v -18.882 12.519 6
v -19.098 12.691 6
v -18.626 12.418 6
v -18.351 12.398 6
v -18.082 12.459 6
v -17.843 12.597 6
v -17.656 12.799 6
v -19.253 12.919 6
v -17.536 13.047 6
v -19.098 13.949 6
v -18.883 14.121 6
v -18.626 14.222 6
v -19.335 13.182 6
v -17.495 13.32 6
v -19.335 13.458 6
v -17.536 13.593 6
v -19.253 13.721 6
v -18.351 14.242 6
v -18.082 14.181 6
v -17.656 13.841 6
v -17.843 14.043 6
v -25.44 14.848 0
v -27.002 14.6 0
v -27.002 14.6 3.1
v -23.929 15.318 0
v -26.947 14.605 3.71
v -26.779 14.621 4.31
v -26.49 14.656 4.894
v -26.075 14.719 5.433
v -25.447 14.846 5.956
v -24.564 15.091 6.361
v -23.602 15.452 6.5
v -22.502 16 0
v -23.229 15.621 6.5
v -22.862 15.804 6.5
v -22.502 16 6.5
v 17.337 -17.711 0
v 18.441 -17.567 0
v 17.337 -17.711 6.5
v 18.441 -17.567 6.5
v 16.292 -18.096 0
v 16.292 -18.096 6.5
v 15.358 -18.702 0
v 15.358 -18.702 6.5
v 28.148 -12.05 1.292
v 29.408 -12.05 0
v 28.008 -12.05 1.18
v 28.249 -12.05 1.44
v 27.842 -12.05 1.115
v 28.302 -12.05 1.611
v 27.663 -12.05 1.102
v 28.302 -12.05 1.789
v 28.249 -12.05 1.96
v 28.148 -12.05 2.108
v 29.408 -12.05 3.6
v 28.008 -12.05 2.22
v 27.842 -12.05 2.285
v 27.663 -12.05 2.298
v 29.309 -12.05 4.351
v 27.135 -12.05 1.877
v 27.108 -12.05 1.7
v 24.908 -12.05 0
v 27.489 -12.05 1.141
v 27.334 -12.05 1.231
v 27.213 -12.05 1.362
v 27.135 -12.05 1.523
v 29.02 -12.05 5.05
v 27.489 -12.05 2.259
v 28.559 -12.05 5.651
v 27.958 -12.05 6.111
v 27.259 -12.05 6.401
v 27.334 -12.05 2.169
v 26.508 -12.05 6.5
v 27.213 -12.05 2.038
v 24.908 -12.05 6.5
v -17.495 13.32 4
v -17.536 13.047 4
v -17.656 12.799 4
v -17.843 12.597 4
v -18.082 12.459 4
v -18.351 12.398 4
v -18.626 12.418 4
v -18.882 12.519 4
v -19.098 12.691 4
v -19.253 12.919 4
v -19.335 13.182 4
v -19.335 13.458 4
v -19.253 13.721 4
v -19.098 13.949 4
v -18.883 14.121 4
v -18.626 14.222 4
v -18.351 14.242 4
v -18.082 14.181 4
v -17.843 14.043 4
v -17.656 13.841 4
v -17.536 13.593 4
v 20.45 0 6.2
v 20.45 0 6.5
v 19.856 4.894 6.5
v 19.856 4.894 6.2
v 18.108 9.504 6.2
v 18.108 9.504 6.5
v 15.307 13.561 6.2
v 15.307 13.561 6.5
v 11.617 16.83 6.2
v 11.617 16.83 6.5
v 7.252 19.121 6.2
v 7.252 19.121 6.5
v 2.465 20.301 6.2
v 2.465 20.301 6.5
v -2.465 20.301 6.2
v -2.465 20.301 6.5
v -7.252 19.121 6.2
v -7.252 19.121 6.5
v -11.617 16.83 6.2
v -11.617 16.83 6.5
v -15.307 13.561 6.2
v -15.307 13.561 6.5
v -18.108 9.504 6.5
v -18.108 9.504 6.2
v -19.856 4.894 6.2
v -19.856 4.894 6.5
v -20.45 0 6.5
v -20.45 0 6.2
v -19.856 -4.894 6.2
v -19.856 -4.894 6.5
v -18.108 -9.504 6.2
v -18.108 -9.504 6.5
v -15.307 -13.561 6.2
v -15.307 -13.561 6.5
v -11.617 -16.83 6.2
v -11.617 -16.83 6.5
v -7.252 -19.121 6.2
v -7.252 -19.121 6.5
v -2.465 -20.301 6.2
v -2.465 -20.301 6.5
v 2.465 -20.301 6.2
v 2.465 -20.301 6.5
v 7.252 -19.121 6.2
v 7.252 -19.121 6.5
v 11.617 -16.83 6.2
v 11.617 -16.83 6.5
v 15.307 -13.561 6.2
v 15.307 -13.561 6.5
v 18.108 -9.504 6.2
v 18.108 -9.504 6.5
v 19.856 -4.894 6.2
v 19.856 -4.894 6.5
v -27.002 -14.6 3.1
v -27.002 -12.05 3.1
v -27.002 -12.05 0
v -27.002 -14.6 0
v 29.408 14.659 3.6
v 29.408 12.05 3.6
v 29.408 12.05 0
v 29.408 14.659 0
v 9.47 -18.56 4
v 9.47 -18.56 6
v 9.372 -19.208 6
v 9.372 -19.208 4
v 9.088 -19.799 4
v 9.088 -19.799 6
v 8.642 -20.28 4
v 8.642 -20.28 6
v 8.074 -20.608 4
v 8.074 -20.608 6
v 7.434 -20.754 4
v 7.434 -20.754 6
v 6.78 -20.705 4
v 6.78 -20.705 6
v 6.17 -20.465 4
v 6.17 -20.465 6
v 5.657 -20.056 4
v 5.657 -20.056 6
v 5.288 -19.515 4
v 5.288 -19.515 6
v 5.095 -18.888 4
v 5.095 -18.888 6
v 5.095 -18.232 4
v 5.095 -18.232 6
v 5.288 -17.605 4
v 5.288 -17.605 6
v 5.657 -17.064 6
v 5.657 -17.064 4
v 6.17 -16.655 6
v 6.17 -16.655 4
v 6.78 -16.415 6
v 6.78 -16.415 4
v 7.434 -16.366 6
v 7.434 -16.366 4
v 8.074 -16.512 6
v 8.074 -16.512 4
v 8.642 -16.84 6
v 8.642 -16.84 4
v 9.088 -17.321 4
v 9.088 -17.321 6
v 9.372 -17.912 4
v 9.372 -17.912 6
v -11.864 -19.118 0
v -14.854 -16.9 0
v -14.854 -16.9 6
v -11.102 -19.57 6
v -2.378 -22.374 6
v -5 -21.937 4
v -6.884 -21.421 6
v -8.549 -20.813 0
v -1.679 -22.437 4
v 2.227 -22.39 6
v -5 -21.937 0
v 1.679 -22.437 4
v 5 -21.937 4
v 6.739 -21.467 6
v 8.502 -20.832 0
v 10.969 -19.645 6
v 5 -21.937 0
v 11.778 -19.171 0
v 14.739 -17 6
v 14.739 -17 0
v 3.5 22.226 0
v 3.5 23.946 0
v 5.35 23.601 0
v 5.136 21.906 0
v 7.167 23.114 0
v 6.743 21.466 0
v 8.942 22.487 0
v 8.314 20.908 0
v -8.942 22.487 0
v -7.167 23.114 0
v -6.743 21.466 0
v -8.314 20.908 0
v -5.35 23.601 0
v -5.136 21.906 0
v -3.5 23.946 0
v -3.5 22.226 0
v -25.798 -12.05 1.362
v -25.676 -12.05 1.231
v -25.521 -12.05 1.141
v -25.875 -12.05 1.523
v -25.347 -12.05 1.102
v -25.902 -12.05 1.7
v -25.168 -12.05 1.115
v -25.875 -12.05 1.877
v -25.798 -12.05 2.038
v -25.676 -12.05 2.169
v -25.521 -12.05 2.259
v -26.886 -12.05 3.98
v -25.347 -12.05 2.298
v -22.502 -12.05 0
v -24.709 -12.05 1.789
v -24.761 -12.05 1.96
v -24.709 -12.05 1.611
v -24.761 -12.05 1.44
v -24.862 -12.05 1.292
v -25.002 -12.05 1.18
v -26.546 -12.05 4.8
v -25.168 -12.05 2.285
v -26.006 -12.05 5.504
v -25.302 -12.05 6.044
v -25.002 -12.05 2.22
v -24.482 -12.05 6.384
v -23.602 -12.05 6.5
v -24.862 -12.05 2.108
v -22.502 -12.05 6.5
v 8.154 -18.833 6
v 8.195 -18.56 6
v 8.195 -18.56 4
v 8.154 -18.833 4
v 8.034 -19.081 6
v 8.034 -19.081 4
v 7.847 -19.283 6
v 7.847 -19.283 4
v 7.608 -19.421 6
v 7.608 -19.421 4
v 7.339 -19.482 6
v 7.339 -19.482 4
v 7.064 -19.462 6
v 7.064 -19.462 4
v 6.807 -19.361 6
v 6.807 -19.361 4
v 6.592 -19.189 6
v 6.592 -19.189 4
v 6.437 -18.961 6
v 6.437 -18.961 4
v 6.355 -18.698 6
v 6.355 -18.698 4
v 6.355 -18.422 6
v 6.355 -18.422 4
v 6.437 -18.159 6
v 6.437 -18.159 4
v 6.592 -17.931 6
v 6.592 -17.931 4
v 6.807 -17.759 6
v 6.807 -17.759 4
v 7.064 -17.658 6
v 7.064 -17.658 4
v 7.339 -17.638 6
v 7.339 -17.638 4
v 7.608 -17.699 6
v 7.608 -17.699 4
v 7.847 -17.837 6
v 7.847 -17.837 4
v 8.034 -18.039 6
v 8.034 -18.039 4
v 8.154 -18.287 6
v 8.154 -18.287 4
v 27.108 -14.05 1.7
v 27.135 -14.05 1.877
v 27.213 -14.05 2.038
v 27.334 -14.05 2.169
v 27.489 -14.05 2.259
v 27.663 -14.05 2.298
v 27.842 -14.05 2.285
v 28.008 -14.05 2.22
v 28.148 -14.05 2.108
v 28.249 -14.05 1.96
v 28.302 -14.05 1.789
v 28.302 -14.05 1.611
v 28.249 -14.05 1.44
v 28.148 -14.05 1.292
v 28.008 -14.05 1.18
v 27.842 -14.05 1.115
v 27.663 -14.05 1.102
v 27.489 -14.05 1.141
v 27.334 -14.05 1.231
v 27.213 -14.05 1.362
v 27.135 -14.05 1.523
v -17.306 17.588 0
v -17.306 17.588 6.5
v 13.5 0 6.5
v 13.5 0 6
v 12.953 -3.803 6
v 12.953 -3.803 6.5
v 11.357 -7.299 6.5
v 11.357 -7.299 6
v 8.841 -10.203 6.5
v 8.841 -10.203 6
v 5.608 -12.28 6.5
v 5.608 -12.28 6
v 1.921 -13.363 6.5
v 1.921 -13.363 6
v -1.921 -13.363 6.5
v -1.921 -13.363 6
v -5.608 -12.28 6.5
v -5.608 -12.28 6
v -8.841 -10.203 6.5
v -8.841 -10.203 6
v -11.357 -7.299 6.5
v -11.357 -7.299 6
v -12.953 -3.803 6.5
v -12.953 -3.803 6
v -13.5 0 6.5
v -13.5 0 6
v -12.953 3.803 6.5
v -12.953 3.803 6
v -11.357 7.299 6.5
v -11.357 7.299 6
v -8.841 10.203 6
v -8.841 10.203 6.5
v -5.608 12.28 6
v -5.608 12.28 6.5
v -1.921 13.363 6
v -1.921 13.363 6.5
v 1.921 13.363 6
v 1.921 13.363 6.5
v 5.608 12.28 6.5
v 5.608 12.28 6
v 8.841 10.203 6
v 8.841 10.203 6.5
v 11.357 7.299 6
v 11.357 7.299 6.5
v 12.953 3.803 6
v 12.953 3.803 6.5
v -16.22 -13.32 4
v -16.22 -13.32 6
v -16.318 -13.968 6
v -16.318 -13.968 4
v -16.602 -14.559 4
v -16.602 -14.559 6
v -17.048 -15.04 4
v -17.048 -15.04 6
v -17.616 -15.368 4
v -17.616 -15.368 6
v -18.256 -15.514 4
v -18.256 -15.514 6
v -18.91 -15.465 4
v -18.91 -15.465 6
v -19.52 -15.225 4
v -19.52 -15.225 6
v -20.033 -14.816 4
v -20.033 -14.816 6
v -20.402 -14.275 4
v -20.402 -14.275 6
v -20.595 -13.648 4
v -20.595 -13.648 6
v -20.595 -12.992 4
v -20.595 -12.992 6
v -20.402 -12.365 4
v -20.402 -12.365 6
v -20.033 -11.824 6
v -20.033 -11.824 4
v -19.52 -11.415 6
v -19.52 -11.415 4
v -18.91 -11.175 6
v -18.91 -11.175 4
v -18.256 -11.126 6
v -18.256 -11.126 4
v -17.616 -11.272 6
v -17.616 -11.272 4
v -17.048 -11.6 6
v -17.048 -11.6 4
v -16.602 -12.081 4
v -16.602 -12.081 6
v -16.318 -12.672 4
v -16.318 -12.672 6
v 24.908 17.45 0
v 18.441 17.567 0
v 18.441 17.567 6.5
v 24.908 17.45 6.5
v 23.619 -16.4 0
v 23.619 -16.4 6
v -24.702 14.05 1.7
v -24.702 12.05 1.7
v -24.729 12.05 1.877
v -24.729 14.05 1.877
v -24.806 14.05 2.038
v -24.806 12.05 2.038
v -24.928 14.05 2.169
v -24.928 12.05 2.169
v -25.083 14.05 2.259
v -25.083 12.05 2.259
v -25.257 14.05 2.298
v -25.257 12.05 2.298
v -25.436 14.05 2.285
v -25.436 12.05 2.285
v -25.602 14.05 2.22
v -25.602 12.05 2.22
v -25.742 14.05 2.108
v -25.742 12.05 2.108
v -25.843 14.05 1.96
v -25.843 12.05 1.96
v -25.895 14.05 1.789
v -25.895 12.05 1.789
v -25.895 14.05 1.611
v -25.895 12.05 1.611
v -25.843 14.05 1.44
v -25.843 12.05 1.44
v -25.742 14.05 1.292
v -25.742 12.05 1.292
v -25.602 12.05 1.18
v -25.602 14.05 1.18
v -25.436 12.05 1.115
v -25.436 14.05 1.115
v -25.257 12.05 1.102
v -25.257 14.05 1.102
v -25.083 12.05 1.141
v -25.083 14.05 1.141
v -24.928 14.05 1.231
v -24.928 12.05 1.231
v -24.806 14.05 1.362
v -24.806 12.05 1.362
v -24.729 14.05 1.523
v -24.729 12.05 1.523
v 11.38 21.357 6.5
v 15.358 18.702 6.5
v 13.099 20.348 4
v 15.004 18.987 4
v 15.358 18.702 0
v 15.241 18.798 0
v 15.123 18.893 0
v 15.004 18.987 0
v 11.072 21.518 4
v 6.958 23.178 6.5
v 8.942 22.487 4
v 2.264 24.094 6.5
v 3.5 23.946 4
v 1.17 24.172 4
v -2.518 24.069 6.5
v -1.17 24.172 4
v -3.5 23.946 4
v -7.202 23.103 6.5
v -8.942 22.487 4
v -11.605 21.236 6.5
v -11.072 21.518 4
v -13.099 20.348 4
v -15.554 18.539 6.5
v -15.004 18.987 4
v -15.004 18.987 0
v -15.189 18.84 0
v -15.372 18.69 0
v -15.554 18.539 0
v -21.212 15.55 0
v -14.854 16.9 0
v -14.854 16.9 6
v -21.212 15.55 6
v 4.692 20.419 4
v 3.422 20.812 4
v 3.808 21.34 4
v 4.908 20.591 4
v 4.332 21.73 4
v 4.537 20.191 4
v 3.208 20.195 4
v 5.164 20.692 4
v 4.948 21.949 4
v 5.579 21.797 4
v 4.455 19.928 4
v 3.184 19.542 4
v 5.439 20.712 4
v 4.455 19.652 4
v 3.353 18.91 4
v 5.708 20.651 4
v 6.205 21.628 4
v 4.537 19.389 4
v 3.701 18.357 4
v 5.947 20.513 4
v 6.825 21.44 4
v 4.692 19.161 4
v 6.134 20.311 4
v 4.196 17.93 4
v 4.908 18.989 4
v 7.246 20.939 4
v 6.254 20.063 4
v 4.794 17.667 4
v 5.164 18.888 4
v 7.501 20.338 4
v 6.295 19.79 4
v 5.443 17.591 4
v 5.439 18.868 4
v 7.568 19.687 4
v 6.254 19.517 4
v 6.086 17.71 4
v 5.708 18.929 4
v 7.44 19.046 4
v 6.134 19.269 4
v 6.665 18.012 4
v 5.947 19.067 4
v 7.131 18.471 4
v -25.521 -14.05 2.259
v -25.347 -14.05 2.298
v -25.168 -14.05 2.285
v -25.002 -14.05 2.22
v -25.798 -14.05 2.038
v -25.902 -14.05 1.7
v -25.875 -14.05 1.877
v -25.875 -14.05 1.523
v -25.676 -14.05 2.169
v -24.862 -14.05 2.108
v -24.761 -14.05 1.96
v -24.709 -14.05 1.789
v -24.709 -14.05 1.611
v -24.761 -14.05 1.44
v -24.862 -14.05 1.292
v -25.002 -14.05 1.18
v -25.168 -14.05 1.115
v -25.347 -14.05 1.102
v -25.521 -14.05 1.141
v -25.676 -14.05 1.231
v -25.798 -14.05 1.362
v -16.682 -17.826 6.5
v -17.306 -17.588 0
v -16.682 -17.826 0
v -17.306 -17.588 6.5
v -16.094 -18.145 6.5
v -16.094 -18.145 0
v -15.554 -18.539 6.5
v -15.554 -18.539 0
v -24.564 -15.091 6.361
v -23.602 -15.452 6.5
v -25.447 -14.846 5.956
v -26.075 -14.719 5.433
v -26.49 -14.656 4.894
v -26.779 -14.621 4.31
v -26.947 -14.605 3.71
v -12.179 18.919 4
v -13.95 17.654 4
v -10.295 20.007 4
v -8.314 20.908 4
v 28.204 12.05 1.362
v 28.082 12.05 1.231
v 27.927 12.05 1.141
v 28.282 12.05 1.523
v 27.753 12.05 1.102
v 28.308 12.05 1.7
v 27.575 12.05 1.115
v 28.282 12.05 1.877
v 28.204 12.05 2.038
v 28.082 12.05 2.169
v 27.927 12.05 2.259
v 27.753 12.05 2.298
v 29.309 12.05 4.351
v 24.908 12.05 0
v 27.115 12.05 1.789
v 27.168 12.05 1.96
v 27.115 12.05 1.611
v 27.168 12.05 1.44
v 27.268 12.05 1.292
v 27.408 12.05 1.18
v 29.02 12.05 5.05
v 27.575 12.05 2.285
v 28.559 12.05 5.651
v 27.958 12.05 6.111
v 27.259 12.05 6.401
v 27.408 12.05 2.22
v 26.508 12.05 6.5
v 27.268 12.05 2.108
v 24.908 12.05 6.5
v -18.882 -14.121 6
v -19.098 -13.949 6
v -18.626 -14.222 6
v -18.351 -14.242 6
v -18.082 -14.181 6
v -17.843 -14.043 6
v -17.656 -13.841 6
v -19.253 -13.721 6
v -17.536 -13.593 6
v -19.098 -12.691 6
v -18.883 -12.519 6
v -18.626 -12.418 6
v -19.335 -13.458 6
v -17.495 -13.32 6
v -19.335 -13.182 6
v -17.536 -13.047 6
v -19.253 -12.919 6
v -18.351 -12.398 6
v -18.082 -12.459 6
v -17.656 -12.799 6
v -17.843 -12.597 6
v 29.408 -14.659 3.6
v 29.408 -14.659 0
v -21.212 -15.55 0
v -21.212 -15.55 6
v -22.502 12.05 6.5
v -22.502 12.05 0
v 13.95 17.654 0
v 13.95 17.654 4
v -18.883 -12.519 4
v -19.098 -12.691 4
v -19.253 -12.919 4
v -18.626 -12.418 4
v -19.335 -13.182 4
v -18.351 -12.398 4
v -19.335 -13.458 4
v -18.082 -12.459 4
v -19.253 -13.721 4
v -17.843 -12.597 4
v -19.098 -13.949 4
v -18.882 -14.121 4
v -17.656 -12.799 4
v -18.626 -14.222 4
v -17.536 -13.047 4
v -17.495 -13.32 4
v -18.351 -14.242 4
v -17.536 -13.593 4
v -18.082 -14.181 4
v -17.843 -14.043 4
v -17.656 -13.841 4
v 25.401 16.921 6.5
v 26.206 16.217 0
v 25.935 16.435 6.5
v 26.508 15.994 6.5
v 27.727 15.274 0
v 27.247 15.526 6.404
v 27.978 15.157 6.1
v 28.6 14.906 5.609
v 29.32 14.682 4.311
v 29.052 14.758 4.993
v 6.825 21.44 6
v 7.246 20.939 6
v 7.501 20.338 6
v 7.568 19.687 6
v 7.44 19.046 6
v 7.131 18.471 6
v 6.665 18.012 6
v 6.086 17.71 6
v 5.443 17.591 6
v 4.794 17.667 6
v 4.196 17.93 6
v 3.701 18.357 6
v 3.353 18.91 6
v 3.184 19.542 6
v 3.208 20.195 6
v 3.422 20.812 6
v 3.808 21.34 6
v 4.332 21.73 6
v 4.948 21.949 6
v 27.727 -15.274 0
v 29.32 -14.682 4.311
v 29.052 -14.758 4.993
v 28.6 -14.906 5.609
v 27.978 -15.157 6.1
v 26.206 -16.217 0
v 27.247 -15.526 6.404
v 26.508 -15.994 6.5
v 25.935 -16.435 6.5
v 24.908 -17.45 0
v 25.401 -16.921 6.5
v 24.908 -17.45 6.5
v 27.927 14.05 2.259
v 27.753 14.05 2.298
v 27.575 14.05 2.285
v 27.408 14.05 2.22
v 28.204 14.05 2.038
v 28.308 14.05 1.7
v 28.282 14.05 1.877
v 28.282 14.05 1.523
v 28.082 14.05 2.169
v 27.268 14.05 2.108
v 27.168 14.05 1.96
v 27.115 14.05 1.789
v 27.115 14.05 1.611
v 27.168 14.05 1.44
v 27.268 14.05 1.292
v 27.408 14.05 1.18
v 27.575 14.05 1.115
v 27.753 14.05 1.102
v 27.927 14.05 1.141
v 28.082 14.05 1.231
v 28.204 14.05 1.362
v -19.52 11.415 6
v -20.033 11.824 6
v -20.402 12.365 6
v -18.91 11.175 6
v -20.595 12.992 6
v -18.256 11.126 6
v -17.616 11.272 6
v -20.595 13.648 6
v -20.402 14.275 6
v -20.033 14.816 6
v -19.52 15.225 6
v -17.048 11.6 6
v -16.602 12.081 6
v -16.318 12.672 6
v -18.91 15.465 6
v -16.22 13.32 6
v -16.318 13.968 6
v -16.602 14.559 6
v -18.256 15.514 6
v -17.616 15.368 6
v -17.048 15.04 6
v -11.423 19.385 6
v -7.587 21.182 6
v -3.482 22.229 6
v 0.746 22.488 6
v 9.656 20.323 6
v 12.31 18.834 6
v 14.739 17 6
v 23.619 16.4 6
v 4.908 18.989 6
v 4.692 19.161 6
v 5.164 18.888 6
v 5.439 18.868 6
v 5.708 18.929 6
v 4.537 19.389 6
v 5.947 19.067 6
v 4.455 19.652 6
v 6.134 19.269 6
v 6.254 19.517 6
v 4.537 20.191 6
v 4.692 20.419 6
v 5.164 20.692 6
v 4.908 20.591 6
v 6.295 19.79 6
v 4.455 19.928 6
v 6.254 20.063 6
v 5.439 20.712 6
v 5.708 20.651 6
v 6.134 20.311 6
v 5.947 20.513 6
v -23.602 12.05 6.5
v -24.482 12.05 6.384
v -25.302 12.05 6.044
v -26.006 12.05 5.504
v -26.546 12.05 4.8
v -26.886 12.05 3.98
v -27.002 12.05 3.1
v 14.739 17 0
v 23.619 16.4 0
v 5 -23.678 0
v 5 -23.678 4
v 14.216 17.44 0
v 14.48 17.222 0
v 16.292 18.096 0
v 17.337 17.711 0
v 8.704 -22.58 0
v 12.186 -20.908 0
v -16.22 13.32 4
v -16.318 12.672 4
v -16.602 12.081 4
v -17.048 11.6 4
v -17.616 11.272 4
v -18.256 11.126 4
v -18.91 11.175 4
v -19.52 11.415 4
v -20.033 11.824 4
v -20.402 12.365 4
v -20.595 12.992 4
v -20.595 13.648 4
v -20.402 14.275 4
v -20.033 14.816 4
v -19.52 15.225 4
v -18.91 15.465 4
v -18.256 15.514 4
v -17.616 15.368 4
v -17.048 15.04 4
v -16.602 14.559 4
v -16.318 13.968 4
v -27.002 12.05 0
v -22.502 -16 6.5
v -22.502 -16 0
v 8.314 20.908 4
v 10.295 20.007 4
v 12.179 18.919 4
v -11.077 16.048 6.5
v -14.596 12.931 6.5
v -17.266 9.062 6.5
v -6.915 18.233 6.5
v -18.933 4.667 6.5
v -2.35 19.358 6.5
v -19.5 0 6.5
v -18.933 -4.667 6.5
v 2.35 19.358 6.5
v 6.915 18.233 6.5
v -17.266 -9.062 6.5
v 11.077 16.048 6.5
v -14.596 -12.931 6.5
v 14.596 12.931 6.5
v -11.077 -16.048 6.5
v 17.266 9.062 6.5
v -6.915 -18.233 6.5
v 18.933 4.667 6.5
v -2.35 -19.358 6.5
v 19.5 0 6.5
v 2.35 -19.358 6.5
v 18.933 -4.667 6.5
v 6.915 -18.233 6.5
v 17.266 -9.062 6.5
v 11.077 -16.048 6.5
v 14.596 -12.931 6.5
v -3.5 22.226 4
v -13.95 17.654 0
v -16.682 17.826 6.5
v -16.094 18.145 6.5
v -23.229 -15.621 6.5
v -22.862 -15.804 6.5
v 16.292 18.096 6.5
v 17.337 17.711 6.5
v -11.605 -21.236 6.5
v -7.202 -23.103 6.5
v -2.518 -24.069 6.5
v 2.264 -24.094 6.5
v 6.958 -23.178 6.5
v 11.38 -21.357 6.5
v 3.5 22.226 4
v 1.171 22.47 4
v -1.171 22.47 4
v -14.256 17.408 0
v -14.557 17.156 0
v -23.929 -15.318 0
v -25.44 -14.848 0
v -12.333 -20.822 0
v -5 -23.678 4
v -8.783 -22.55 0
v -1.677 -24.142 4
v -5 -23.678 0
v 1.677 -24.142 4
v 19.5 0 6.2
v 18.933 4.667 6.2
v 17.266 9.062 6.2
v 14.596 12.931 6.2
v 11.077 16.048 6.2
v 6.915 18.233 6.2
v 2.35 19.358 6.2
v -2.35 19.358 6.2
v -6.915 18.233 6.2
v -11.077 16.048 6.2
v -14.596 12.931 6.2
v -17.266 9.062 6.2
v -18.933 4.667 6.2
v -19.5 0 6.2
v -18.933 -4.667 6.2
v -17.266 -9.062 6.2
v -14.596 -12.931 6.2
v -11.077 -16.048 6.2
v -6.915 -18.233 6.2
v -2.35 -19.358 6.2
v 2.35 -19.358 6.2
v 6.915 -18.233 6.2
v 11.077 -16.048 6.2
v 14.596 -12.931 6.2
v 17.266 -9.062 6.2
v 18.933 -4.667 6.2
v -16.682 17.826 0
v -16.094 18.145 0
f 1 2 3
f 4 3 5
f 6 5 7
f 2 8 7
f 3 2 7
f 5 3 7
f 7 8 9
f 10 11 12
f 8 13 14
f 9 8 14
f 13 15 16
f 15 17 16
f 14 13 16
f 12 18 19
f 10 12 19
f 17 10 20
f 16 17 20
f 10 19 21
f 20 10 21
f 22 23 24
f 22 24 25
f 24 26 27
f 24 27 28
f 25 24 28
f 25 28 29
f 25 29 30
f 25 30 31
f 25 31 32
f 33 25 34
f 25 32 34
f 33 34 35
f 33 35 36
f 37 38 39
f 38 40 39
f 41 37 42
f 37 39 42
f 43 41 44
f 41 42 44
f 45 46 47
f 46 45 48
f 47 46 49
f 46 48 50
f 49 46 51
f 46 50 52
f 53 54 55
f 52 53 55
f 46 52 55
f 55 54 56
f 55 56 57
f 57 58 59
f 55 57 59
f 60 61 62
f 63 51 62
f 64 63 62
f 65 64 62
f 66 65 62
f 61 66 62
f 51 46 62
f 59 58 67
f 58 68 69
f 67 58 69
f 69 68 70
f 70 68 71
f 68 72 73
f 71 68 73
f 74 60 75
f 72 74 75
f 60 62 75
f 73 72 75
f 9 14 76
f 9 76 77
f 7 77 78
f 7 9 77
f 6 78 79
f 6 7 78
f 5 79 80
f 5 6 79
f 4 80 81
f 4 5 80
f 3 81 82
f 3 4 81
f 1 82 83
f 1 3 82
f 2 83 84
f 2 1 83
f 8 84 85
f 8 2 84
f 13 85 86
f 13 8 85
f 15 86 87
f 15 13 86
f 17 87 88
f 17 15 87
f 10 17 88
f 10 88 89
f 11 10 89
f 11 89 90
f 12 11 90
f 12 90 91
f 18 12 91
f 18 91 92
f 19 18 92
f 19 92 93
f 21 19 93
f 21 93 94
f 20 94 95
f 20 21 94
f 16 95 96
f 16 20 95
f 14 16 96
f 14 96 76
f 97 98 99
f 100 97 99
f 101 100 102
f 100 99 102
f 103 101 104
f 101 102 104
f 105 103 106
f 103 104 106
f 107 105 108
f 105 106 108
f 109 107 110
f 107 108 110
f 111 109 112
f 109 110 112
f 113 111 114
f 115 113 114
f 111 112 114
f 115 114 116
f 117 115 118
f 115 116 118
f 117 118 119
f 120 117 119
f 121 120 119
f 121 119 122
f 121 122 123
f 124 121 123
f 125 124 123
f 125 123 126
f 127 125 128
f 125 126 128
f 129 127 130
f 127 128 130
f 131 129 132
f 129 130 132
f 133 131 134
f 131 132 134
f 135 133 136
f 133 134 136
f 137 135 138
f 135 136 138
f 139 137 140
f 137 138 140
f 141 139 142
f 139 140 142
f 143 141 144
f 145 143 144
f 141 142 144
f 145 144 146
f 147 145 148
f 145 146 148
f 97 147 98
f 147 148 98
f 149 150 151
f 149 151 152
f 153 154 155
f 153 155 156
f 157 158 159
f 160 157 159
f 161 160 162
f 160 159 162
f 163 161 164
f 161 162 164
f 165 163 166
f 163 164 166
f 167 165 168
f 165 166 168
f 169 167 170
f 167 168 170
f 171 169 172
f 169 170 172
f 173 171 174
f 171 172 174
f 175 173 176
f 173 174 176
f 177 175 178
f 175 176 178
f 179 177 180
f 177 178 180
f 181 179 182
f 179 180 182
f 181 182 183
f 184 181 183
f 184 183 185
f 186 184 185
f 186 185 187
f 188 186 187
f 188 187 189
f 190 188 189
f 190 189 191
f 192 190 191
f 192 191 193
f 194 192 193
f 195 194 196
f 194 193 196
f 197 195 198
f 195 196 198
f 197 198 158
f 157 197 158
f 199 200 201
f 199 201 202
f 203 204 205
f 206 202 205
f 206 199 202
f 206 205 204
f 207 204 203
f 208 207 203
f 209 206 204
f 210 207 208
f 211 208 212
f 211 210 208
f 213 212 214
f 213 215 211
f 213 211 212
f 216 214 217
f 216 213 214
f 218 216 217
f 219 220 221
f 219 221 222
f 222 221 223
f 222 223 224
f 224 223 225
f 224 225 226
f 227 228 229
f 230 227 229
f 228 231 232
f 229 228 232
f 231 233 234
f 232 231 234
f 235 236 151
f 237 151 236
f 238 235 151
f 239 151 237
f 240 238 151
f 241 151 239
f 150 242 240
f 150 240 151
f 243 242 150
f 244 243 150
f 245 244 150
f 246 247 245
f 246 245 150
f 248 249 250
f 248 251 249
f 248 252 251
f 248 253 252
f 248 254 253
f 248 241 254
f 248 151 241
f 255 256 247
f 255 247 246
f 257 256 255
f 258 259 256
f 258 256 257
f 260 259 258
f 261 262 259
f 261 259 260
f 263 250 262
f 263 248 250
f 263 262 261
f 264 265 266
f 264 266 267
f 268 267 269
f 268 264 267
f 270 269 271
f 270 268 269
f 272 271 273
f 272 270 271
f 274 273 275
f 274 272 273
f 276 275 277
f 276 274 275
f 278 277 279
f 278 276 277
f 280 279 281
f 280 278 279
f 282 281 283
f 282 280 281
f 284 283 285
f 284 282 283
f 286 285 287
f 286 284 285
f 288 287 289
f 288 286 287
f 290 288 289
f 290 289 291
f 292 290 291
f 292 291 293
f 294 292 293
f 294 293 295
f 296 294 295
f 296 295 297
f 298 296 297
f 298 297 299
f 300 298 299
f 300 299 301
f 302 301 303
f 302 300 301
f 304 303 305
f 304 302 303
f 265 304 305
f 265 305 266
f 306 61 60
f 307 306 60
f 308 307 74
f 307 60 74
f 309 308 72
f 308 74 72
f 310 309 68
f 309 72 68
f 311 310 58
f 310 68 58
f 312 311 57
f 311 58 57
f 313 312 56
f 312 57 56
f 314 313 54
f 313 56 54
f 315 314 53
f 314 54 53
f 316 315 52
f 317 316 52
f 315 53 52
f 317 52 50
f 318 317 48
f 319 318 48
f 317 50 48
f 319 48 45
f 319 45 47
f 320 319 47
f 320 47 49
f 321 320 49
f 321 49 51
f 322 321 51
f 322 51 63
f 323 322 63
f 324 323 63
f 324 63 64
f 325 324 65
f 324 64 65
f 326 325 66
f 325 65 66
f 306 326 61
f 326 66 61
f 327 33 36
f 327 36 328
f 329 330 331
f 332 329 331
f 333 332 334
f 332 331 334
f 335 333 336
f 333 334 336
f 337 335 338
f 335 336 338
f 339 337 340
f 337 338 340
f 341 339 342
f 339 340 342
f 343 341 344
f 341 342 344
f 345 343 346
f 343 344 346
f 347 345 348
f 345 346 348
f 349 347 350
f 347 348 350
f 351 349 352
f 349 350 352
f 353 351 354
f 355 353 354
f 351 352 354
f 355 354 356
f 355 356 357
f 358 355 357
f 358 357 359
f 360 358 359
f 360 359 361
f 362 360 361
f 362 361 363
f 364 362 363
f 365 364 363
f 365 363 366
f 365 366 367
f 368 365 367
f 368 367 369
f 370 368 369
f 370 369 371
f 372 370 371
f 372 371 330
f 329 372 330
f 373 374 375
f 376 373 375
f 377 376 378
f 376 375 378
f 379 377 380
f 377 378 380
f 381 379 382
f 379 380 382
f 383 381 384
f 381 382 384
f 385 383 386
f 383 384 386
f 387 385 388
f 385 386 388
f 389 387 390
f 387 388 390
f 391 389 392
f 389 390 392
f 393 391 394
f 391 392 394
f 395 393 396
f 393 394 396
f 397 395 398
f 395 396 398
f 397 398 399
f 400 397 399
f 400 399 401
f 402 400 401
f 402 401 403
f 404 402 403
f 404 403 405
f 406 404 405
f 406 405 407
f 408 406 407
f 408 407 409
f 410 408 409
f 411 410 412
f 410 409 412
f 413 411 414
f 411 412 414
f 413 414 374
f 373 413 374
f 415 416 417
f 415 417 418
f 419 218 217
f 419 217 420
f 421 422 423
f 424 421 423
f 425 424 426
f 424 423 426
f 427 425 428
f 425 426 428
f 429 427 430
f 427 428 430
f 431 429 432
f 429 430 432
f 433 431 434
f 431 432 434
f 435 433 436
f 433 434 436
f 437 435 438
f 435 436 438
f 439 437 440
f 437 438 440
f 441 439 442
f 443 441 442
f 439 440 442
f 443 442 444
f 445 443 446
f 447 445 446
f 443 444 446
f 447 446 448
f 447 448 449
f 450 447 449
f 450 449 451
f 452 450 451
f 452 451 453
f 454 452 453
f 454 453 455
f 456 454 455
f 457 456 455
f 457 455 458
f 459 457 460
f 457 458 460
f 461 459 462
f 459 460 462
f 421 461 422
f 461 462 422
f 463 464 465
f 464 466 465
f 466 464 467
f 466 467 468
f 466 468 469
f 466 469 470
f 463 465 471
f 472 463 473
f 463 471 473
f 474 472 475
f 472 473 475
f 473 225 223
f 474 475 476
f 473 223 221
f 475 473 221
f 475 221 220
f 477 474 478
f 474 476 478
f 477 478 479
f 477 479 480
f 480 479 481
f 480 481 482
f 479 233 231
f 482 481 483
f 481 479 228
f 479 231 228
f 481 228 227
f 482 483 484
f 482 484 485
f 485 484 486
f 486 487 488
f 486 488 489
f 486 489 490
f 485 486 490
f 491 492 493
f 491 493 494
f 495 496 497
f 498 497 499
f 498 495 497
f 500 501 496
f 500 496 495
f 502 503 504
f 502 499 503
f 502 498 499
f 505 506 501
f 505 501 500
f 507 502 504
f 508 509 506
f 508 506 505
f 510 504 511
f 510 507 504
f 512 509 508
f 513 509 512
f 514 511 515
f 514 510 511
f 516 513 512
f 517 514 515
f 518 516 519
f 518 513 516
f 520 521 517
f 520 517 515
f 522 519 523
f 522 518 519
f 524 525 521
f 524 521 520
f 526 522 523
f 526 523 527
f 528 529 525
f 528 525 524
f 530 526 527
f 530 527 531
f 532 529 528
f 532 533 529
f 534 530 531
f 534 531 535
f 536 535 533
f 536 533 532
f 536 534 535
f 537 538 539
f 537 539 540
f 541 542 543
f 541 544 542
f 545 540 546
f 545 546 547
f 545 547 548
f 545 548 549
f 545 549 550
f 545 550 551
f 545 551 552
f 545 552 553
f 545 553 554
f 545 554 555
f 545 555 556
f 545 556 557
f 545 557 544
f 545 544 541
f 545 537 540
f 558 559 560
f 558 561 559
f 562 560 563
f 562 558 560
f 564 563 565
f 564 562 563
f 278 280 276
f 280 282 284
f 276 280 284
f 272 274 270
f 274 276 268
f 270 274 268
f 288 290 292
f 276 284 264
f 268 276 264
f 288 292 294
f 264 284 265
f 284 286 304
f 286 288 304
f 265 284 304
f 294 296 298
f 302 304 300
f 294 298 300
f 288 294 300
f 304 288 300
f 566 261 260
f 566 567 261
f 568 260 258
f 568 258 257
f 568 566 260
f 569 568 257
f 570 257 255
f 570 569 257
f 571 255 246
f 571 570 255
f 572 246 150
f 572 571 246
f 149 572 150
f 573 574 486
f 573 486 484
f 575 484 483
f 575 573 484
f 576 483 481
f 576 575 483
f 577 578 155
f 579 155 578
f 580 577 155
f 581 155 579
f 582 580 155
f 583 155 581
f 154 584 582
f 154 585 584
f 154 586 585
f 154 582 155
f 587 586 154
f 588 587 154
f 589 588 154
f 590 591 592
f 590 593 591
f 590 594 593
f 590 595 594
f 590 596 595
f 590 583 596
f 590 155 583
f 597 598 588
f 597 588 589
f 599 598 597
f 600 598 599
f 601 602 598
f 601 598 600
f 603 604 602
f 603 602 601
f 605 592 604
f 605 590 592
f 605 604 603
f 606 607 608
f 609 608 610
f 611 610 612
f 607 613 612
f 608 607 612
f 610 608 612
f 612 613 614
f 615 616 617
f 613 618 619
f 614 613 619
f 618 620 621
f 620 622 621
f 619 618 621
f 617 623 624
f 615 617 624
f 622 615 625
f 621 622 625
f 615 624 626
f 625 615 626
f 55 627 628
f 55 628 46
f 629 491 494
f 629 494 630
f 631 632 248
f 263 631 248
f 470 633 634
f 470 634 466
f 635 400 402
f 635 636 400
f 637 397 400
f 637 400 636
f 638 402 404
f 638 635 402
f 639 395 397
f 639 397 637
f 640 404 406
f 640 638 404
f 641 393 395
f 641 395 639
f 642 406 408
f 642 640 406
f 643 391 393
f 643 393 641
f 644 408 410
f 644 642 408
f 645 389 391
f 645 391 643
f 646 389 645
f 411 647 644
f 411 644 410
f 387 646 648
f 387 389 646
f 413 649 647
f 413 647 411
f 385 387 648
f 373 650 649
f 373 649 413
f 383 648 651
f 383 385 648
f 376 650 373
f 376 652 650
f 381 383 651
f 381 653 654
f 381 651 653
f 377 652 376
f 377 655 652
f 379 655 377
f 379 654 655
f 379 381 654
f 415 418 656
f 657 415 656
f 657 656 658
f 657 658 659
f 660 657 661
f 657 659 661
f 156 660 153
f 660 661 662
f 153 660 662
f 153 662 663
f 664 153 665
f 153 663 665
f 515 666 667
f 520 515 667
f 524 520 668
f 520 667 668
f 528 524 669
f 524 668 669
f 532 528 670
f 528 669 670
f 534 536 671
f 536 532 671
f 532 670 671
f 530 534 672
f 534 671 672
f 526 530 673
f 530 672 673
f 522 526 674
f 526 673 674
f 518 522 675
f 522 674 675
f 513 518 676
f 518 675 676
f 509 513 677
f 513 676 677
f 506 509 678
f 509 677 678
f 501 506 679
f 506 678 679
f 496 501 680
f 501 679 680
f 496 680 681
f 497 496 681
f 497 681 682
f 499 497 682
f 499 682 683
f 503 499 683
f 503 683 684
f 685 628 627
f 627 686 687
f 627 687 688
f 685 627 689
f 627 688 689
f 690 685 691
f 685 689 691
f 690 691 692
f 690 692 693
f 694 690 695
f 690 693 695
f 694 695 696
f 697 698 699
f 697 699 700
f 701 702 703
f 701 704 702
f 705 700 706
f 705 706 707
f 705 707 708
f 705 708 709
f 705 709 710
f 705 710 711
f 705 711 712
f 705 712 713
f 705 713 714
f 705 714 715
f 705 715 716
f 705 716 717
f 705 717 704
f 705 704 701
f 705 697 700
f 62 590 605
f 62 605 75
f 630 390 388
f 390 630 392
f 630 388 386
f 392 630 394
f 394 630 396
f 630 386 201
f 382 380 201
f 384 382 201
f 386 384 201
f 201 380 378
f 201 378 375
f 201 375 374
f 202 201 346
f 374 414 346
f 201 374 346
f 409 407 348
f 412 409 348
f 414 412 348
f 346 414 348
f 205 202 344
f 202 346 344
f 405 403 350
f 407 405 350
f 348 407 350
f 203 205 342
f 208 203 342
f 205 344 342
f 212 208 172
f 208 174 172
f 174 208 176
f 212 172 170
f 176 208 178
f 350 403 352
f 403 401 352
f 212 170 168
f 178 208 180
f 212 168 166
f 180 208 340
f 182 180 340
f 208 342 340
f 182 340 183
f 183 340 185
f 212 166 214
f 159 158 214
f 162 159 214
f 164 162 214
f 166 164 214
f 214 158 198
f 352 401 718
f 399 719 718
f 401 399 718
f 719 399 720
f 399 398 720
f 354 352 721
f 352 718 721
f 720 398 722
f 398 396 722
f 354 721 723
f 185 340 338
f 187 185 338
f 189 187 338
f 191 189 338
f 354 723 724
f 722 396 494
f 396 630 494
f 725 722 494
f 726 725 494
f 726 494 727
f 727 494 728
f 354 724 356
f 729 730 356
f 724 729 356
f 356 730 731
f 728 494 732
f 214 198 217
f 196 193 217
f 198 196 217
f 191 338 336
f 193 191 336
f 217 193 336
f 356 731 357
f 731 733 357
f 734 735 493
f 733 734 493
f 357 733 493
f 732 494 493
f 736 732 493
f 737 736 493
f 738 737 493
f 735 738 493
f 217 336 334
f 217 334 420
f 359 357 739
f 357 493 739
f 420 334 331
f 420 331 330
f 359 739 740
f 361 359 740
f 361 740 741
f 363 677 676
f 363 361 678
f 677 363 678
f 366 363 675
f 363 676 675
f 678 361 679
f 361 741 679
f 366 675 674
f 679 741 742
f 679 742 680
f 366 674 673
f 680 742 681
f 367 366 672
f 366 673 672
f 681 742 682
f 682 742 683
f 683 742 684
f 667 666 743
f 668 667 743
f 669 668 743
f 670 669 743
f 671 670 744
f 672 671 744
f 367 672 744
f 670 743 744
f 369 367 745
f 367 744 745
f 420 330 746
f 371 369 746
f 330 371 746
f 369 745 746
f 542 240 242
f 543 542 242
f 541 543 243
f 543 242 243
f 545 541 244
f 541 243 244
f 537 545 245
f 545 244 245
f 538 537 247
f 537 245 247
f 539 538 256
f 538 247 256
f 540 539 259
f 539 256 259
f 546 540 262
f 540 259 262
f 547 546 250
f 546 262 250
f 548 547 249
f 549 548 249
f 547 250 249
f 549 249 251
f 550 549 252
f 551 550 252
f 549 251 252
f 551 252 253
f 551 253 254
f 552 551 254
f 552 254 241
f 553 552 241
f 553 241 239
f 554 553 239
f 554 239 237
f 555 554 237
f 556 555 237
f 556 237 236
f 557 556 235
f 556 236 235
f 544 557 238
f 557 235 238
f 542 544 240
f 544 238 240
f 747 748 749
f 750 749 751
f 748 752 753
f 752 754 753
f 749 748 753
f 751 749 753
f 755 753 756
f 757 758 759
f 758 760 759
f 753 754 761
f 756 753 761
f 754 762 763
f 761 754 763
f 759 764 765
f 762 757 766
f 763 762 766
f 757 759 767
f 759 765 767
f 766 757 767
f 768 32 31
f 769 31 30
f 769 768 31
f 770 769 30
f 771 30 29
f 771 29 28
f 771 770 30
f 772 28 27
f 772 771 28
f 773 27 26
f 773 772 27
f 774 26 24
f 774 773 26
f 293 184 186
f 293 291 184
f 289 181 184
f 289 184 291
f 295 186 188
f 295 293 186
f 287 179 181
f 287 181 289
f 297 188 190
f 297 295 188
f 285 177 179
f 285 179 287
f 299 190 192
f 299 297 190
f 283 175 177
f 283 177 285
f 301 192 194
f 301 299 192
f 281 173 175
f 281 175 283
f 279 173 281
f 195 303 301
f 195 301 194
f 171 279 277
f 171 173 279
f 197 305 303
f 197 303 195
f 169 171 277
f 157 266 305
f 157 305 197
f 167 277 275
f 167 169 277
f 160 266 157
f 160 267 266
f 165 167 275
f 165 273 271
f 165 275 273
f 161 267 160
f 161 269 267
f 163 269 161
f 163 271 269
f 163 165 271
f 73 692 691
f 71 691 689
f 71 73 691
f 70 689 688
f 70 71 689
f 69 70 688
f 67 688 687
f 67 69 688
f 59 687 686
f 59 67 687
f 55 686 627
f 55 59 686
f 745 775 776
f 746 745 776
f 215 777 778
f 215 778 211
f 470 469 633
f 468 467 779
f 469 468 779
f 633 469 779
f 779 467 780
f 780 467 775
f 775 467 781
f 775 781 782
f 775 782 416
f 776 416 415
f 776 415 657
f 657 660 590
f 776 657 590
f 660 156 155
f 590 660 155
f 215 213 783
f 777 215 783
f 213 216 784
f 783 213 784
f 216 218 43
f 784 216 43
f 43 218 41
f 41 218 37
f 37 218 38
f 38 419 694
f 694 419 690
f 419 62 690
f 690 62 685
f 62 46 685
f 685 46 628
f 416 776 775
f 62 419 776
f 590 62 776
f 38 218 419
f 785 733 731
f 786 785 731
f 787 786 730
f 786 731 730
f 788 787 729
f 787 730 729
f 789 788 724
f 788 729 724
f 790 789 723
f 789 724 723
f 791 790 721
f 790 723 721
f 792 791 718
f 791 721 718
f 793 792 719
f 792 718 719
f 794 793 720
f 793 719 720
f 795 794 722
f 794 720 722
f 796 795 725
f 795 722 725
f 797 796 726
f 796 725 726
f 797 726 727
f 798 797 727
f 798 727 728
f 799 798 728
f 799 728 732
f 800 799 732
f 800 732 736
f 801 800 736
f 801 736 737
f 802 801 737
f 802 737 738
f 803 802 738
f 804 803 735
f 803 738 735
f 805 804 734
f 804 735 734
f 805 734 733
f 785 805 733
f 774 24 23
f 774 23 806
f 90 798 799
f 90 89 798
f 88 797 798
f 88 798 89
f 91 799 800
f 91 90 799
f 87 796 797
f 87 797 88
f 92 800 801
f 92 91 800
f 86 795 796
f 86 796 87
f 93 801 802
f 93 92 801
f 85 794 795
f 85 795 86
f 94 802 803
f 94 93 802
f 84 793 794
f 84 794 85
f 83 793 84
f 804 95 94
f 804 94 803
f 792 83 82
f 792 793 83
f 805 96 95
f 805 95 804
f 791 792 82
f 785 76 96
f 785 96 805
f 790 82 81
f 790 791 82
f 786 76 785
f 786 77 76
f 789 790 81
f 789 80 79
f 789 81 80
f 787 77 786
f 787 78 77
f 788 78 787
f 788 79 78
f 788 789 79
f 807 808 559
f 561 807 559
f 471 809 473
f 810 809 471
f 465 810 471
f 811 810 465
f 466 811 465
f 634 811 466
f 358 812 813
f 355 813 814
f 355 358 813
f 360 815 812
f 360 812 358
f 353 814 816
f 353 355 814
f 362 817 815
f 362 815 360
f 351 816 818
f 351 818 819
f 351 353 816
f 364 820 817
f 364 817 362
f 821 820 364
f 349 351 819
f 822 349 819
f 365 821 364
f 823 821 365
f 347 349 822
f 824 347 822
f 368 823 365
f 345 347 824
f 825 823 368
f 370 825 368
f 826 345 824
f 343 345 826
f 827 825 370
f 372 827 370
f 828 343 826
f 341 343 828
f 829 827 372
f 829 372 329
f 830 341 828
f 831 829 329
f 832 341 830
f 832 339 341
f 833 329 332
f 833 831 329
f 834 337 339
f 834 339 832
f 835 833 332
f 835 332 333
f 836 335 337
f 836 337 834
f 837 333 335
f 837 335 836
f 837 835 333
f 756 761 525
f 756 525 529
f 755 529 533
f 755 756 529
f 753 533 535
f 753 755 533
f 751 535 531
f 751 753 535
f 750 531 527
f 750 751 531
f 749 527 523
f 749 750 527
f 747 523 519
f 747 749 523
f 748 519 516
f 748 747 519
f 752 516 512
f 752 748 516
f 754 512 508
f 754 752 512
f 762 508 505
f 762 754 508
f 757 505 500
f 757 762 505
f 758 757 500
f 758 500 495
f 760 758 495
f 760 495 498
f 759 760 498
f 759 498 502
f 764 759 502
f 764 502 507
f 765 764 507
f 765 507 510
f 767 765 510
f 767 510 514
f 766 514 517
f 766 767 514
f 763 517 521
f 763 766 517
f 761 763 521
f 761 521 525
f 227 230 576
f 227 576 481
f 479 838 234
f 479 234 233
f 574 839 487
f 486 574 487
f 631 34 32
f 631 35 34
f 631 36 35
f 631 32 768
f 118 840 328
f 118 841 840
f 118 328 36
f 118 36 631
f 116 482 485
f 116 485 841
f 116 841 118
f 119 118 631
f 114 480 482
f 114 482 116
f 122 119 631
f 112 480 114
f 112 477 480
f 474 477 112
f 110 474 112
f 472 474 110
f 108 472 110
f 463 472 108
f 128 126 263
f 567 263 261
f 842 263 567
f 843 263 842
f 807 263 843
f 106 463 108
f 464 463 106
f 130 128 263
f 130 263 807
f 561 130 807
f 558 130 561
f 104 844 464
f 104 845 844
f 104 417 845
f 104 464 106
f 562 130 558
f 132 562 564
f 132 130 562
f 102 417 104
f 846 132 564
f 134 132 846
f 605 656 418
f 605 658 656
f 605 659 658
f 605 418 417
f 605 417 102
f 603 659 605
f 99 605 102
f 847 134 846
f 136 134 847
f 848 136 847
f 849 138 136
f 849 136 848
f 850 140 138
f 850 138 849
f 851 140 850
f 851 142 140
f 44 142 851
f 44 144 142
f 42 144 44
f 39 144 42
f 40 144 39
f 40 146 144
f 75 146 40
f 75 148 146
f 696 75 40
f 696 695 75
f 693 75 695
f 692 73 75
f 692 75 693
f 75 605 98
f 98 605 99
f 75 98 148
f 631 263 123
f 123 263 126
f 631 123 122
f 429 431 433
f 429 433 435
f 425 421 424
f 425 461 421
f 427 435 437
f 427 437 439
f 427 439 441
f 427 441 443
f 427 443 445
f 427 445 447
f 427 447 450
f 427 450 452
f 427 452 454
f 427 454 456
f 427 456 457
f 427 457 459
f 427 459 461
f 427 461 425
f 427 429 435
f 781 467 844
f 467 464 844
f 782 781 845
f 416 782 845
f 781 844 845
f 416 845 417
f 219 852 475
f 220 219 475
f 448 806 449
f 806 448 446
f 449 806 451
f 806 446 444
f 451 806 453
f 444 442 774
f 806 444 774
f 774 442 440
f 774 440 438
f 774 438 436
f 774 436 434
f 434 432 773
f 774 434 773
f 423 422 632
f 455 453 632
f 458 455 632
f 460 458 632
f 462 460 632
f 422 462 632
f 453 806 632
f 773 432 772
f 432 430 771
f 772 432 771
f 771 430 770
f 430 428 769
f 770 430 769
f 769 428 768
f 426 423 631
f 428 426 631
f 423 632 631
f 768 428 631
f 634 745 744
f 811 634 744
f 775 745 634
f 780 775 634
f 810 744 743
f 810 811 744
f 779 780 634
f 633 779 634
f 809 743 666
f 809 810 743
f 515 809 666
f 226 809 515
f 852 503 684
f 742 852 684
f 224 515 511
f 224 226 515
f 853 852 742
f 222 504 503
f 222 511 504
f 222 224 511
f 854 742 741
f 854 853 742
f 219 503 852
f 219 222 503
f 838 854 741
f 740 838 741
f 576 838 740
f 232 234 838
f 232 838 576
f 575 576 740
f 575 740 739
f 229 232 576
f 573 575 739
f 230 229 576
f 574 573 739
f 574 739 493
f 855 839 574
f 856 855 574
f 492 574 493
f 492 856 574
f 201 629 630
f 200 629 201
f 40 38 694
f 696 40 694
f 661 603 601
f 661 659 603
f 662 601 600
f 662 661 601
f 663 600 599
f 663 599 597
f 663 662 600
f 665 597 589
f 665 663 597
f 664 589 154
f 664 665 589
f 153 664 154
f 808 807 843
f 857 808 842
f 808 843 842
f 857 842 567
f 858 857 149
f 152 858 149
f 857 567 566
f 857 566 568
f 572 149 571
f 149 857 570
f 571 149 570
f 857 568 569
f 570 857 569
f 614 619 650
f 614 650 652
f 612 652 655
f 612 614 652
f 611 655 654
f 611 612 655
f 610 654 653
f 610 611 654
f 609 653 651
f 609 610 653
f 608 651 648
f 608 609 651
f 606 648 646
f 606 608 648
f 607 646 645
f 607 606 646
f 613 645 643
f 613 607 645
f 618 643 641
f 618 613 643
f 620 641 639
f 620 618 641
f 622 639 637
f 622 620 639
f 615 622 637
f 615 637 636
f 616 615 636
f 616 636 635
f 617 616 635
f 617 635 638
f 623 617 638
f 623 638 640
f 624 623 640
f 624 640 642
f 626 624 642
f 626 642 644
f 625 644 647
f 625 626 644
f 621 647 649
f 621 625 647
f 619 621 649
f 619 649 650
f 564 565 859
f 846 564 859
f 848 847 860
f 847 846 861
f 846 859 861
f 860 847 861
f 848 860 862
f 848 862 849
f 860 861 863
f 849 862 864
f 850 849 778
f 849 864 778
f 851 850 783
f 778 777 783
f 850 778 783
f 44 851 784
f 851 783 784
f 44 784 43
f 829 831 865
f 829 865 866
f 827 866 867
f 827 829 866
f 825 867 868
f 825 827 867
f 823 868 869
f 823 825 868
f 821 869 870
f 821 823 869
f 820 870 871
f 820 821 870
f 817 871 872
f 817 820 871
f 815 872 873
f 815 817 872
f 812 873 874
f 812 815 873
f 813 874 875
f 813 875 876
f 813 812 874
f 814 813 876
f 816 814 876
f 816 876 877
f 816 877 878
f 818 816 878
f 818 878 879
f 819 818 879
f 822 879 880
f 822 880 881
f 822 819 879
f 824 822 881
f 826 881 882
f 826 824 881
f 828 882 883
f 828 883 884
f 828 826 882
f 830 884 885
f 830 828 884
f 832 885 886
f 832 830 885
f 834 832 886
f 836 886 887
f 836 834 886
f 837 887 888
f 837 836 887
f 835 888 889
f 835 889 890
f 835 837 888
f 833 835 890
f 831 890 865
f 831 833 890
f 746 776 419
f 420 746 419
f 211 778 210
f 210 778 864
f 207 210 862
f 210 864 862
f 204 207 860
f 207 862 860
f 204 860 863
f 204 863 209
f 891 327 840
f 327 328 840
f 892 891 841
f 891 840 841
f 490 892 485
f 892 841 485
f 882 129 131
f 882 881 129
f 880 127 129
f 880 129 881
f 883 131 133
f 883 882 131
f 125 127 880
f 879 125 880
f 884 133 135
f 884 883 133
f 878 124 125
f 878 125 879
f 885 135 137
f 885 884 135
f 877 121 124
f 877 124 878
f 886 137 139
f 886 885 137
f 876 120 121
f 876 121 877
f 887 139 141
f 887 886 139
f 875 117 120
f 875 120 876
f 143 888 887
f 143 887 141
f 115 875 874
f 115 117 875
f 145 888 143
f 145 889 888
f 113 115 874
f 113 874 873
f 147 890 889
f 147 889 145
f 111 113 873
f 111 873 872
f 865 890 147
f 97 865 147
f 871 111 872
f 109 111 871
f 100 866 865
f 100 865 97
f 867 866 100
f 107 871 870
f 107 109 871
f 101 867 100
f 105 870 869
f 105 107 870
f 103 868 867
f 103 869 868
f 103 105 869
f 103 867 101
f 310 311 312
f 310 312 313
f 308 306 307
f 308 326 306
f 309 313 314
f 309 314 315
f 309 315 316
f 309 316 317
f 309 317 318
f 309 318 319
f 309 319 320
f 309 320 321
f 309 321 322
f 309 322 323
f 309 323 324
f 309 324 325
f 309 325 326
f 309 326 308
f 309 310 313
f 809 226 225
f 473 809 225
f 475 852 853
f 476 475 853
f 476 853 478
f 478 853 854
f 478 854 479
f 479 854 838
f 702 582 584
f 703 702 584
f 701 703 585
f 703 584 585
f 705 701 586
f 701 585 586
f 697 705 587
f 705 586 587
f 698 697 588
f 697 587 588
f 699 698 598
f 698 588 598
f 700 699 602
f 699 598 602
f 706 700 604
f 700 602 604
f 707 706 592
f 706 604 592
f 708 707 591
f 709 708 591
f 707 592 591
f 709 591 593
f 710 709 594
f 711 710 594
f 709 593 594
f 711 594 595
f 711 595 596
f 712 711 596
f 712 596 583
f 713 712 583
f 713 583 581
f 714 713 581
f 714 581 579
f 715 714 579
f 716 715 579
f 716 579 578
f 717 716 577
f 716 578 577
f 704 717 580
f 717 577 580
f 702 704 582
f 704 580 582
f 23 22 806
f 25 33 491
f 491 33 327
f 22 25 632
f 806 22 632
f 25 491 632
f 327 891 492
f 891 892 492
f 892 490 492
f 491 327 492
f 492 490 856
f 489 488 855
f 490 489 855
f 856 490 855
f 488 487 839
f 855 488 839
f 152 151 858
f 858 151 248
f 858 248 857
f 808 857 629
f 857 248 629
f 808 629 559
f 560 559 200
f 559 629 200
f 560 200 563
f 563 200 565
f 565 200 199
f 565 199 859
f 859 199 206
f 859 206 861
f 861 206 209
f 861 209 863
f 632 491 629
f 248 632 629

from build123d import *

# Parameters (mm, degrees)
PAD_DEPTH       = 6.5
POCKET_DEPTH    = 6
SKETCH002_R     = 13.5
POCKET001_DEPTH = 1
SKETCH003_W     = 5.4
SKETCH003_H     = 6.5
PAD001_DEPTH    = 4.5
POCKET002_DEPTH = 10
SKETCH008_R     = 0.6
POCKET003_DEPTH = 2
SKETCH009_R     = 0.6
POCKET004_DEPTH = 2
FILLET_R        = 2.9
FILLET001_R     = 2.9
FILLET002_R     = 5
FILLET003_R     = 5
FILLET004_R     = 5
FILLET005_R     = 5
SKETCH010_W     = 3.95
SKETCH010_H     = 6.5
PAD002_DEPTH    = 4.5
POCKET005_DEPTH = 10
SKETCH012_R     = 0.6
POCKET006_DEPTH = 2
SKETCH013_R     = 0.6
POCKET007_DEPTH = 2
FILLET006_R     = 3.4
FILLET007_R     = 3.4
SKETCH014_R     = 20.45
SKETCH014_R_2   = 19.5
POCKET008_DEPTH = 0.3
SKETCH015_R     = 2.2
SKETCH015_R_2   = 0.925
PAD003_DEPTH    = 2
POCKET009_DEPTH = 4
POCKET010_DEPTH = 4


with BuildPart() as part:
    # Sketch → Pad (new body)
    with BuildSketch(Plane.XY):
        with BuildLine():
            Line((-22.5019915649, 16), (-22.5019915649, -16))
            Line((-22.5019915649, -16), (-16.2858834578, -17.9000000001))
            ThreePointArc((-16.2858834577, -17.9000000001), (0.2206895737, -24.1989937004), (16.6096357576, -17.5999999999))
            Line((16.6096357576, -17.5999999999), (24.9082802252, -17.45))
            Line((24.9082802252, 17.45), (24.9082802252, -17.45))
            Line((16.6096357576, 17.6), (24.9082802252, 17.45))
            ThreePointArc((16.6096357576, 17.6), (0.2206895736, 24.1989937004), (-16.2858834578, 17.9))
            Line((-22.5019915649, 16), (-16.2858834578, 17.9))
        make_face()
    extrude(amount=PAD_DEPTH)

    # Sketch001 → Pocket (cut)
    with BuildSketch(Plane.XY):
        with BuildLine():
            Line((-14.8539557021, 16.9), (-21.2122180433, 15.55))
            Line((-21.2122180433, 15.55), (-21.2122180433, -15.55))
            Line((-21.2122180433, -15.55), (-14.8539557021, -16.9))
            ThreePointArc((-14.8539557021, -16.9), (-0.0760301383, -22.4998715423), (14.739402973, -17))
            Line((14.739402973, -17), (23.6191552218, -16.4))
            Line((23.6191552218, 16.4), (23.6191552218, -16.4))
            Line((14.739402973, 17), (23.6191552218, 16.4))
            ThreePointArc((14.739402973, 17), (-0.0760301383, 22.4998715423), (-14.8539557021, 16.9))
        make_face()
    extrude(amount=POCKET_DEPTH, mode=Mode.SUBTRACT)

    # Sketch002 (on Face19 of Pocket) → Pocket001 (cut)
    with BuildSketch(Plane(origin=(0, 0, 6), x_dir=(1, 0, 0), z_dir=(0, 0, -1))):
        Circle(SKETCH002_R)
    extrude(amount=-POCKET001_DEPTH, mode=Mode.SUBTRACT)

    # Sketch003 (on Face6 of Pocket001) → Pad001 (join)
    with BuildSketch(Plane.YZ.offset(24.9082802252)):
        with Locations((-14.75, 3.25)):
            Rectangle(SKETCH003_W, SKETCH003_H)
        with Locations((14.75, 3.25)):
            Rectangle(SKETCH003_W, SKETCH003_H)
    extrude(amount=PAD001_DEPTH)

    # Sketch006 → Pocket002 (cut)
    with BuildSketch(Plane.XY.offset(6.5)):
        with BuildLine():
            ThreePointArc((24.9082802253, 17.45), (26.9423471239, 15.7065020586), (29.4082802252, 14.6594169812))
            Line((29.4082802252, 17.45), (29.4082802252, 14.6594169812))
            Line((29.4082802252, 17.45), (24.9082802252, 17.45))
        make_face()
        with BuildLine():
            ThreePointArc((29.4082802253, -14.6594169812), (26.9423471239, -15.7065020586), (24.9082802253, -17.45))
            Line((29.4082802252, -17.45), (24.9082802252, -17.45))
            Line((29.4082802253, -14.6594169811), (29.4082802252, -17.45))
        make_face()
    extrude(amount=-POCKET002_DEPTH, mode=Mode.SUBTRACT)

    # Sketch008 (on Face27 of Pocket002) → Pocket003 (cut)
    with BuildSketch(Plane(origin=(0, -12.05, 0), x_dir=(-1, 0, 0), z_dir=(0, 1, 0))):
        with Locations((-27.7082802252, 1.7)):
            Circle(SKETCH008_R)
    extrude(amount=-POCKET003_DEPTH, mode=Mode.SUBTRACT)

    # Sketch009 (on Face26 of Pocket003) → Pocket004 (cut)
    with BuildSketch(Plane.XZ.offset(-12.05)):
        with Locations((27.7082802252, 1.7)):
            Circle(SKETCH009_R)
    extrude(amount=-POCKET004_DEPTH, mode=Mode.SUBTRACT)

    # Fillet
    fillet_edges = [part.edges().sort_by_distance(p)[0] for p in [
        (29.40828, -13.354708, 6.5),
    ]]
    fillet(fillet_edges, radius=FILLET_R)

    # Fillet001
    fillet001_edges = [part.edges().sort_by_distance(p)[0] for p in [
        (29.40828, 13.354708, 6.5),
    ]]
    fillet(fillet001_edges, radius=FILLET001_R)

    # Fillet002
    fillet002_edges = [part.edges().sort_by_distance(p)[0] for p in [
        (16.609636, -17.6, 3.25),
    ]]
    fillet(fillet002_edges, radius=FILLET002_R)

    # Fillet003
    fillet003_edges = [part.edges().sort_by_distance(p)[0] for p in [
        (16.609636, 17.6, 3.25),
    ]]
    fillet(fillet003_edges, radius=FILLET003_R)

    # Fillet004
    fillet004_edges = [part.edges().sort_by_distance(p)[0] for p in [
        (-16.285883, -17.9, 3.25),
    ]]
    fillet(fillet004_edges, radius=FILLET004_R)

    # Fillet005
    fillet005_edges = [part.edges().sort_by_distance(p)[0] for p in [
        (-16.285883, 17.9, 3.25),
    ]]
    fillet(fillet005_edges, radius=FILLET005_R)

    # Sketch010 (on Face4 of Fillet005) → Pad002 (join)
    with BuildSketch(Plane(origin=(-22.5019915649, 0, 0), x_dir=(0, -1, 0), z_dir=(-1, 0, 0))):
        with Locations((-14.025, 3.25)):
            Rectangle(SKETCH010_W, SKETCH010_H)
        with Locations((14.025, 3.25)):
            Rectangle(SKETCH010_W, SKETCH010_H)
    extrude(amount=PAD002_DEPTH)

    # Sketch011 (on Face6 of Pad002) → Pocket005 (cut)
    with BuildSketch(Plane.XY.offset(6.5)):
        with BuildLine():
            ThreePointArc((-27.0019915649, 14.6), (-24.6759937451, 15.0557212933), (-22.5019915649, 16))
            Line((-22.5019915649, 16), (-27.0019915649, 16))
            Line((-27.0019915649, 16), (-27.0019915649, 14.6))
        make_face()
        with BuildLine():
            ThreePointArc((-22.5019915649, -16), (-24.6759937451, -15.0557212933), (-27.0019915649, -14.6))
            Line((-27.0019915649, -14.6), (-27.0019915649, -16))
            Line((-27.0019915649, -16), (-22.5019915649, -16))
        make_face()
    extrude(amount=-POCKET005_DEPTH, mode=Mode.SUBTRACT)

    # Sketch012 (on Face23 of Pocket005) → Pocket006 (cut)
    with BuildSketch(Plane(origin=(0, -12.05, 0), x_dir=(-1, 0, 0), z_dir=(0, 1, 0))):
        with Locations((25.3019915649, 1.7)):
            Circle(SKETCH012_R)
    extrude(amount=-POCKET006_DEPTH, mode=Mode.SUBTRACT)

    # Sketch013 (on Face21 of Pocket006) → Pocket007 (cut)
    with BuildSketch(Plane.XZ.offset(-12.05)):
        with Locations((-25.3019915649, 1.7)):
            Circle(SKETCH013_R)
    extrude(amount=-POCKET007_DEPTH, mode=Mode.SUBTRACT)

    # Fillet006
    fillet006_edges = [part.edges().sort_by_distance(p)[0] for p in [
        (-27.001992, 13.325, 6.5),
    ]]
    fillet(fillet006_edges, radius=FILLET006_R)

    # Fillet007
    fillet007_edges = [part.edges().sort_by_distance(p)[0] for p in [
        (-27.001992, -13.325, 6.5),
    ]]
    fillet(fillet007_edges, radius=FILLET007_R)

    # Sketch014 (on Face4 of Fillet007) → Pocket008 (cut)
    with BuildSketch(Plane.XY.offset(6.5)):
        Circle(SKETCH014_R)
        Circle(SKETCH014_R_2, mode=Mode.SUBTRACT)
    extrude(amount=-POCKET008_DEPTH, mode=Mode.SUBTRACT)

    # Sketch015 (on Face55 of Pocket008) → Pad003 (join)
    with BuildSketch(Plane(origin=(0, 0, 6), x_dir=(1, 0, 0), z_dir=(0, 0, -1))):
        with Locations((-18.42, 13.32)):
            Circle(SKETCH015_R)
        with Locations((-18.42, 13.32)):
            Circle(SKETCH015_R_2, mode=Mode.SUBTRACT)
        with Locations((7.27, 18.56)):
            Circle(SKETCH015_R)
        with Locations((7.27, 18.56)):
            Circle(SKETCH015_R_2, mode=Mode.SUBTRACT)
        with Locations((5.37, -19.79)):
            Circle(SKETCH015_R)
        with Locations((5.37, -19.79)):
            Circle(SKETCH015_R_2, mode=Mode.SUBTRACT)
        with Locations((-18.42, -13.32)):
            Circle(SKETCH015_R)
        with Locations((-18.42, -13.32)):
            Circle(SKETCH015_R_2, mode=Mode.SUBTRACT)
    extrude(amount=PAD003_DEPTH)

    # Sketch016 → Pocket009 (cut)
    with BuildSketch(Plane(origin=(0, 0, 0), x_dir=(-1, 0, 0), z_dir=(0, 0, 1))):
        with BuildLine():
            Line((-5, 23.6778377391), (-5, 21.9374109685))
            ThreePointArc((5, 21.9374109685), (0, 22.5), (-5, 21.9374109685))
            Line((5, 23.6778377391), (5, 21.9374109685))
            ThreePointArc((5, 23.6778377391), (0, 24.2), (-5, 23.6778377391))
        make_face()
    extrude(amount=POCKET009_DEPTH, mode=Mode.SUBTRACT)

    # Sketch017 → Pocket010 (cut)
    with BuildSketch(Plane(origin=(0, 0, 0), x_dir=(-1, 0, 0), z_dir=(0, 0, 1))):
        with BuildLine():
            Line((-3.499984119, -22.2261132717), (-3.5, -23.9455632634))
            ThreePointArc((-3.5, -23.9455632634), (0, -24.2000019575), (3.5, -23.9455632634))
            Line((3.5000158811, -22.2261082701), (3.5, -23.9455632634))
            ThreePointArc((-3.499984119, -22.2261132717), (1.60767e-05, -22.5), (3.5000158811, -22.2261082701))
        make_face()
        with BuildLine():
            ThreePointArc((-13.9498796389, -17.6536358312), (-11.25, -19.4855715851), (-8.3135572795, -20.9077680626))
            Line((-8.3135572795, -20.9077680626), (-8.9416927184, -22.487466094))
            ThreePointArc((-15.0038705449, -18.987466094), (-12.1, -20.9578147716), (-8.9416927184, -22.487466094))
            Line((-13.9498796389, -17.6536358312), (-15.0038705449, -18.987466094))
        make_face()
        with BuildLine():
            ThreePointArc((8.3135572795, -20.9077680626), (11.25, -19.4855715851), (13.9498796389, -17.6536358312))
            Line((13.9498796389, -17.6536358312), (15.0038705449, -18.987466094))
            ThreePointArc((8.9416927184, -22.487466094), (12.1, -20.9578147716), (15.0038705449, -18.987466094))
            Line((8.3135572795, -20.9077680626), (8.9416927184, -22.487466094))
        make_face()
    extrude(amount=POCKET010_DEPTH, mode=Mode.SUBTRACT)


solid = part.part
